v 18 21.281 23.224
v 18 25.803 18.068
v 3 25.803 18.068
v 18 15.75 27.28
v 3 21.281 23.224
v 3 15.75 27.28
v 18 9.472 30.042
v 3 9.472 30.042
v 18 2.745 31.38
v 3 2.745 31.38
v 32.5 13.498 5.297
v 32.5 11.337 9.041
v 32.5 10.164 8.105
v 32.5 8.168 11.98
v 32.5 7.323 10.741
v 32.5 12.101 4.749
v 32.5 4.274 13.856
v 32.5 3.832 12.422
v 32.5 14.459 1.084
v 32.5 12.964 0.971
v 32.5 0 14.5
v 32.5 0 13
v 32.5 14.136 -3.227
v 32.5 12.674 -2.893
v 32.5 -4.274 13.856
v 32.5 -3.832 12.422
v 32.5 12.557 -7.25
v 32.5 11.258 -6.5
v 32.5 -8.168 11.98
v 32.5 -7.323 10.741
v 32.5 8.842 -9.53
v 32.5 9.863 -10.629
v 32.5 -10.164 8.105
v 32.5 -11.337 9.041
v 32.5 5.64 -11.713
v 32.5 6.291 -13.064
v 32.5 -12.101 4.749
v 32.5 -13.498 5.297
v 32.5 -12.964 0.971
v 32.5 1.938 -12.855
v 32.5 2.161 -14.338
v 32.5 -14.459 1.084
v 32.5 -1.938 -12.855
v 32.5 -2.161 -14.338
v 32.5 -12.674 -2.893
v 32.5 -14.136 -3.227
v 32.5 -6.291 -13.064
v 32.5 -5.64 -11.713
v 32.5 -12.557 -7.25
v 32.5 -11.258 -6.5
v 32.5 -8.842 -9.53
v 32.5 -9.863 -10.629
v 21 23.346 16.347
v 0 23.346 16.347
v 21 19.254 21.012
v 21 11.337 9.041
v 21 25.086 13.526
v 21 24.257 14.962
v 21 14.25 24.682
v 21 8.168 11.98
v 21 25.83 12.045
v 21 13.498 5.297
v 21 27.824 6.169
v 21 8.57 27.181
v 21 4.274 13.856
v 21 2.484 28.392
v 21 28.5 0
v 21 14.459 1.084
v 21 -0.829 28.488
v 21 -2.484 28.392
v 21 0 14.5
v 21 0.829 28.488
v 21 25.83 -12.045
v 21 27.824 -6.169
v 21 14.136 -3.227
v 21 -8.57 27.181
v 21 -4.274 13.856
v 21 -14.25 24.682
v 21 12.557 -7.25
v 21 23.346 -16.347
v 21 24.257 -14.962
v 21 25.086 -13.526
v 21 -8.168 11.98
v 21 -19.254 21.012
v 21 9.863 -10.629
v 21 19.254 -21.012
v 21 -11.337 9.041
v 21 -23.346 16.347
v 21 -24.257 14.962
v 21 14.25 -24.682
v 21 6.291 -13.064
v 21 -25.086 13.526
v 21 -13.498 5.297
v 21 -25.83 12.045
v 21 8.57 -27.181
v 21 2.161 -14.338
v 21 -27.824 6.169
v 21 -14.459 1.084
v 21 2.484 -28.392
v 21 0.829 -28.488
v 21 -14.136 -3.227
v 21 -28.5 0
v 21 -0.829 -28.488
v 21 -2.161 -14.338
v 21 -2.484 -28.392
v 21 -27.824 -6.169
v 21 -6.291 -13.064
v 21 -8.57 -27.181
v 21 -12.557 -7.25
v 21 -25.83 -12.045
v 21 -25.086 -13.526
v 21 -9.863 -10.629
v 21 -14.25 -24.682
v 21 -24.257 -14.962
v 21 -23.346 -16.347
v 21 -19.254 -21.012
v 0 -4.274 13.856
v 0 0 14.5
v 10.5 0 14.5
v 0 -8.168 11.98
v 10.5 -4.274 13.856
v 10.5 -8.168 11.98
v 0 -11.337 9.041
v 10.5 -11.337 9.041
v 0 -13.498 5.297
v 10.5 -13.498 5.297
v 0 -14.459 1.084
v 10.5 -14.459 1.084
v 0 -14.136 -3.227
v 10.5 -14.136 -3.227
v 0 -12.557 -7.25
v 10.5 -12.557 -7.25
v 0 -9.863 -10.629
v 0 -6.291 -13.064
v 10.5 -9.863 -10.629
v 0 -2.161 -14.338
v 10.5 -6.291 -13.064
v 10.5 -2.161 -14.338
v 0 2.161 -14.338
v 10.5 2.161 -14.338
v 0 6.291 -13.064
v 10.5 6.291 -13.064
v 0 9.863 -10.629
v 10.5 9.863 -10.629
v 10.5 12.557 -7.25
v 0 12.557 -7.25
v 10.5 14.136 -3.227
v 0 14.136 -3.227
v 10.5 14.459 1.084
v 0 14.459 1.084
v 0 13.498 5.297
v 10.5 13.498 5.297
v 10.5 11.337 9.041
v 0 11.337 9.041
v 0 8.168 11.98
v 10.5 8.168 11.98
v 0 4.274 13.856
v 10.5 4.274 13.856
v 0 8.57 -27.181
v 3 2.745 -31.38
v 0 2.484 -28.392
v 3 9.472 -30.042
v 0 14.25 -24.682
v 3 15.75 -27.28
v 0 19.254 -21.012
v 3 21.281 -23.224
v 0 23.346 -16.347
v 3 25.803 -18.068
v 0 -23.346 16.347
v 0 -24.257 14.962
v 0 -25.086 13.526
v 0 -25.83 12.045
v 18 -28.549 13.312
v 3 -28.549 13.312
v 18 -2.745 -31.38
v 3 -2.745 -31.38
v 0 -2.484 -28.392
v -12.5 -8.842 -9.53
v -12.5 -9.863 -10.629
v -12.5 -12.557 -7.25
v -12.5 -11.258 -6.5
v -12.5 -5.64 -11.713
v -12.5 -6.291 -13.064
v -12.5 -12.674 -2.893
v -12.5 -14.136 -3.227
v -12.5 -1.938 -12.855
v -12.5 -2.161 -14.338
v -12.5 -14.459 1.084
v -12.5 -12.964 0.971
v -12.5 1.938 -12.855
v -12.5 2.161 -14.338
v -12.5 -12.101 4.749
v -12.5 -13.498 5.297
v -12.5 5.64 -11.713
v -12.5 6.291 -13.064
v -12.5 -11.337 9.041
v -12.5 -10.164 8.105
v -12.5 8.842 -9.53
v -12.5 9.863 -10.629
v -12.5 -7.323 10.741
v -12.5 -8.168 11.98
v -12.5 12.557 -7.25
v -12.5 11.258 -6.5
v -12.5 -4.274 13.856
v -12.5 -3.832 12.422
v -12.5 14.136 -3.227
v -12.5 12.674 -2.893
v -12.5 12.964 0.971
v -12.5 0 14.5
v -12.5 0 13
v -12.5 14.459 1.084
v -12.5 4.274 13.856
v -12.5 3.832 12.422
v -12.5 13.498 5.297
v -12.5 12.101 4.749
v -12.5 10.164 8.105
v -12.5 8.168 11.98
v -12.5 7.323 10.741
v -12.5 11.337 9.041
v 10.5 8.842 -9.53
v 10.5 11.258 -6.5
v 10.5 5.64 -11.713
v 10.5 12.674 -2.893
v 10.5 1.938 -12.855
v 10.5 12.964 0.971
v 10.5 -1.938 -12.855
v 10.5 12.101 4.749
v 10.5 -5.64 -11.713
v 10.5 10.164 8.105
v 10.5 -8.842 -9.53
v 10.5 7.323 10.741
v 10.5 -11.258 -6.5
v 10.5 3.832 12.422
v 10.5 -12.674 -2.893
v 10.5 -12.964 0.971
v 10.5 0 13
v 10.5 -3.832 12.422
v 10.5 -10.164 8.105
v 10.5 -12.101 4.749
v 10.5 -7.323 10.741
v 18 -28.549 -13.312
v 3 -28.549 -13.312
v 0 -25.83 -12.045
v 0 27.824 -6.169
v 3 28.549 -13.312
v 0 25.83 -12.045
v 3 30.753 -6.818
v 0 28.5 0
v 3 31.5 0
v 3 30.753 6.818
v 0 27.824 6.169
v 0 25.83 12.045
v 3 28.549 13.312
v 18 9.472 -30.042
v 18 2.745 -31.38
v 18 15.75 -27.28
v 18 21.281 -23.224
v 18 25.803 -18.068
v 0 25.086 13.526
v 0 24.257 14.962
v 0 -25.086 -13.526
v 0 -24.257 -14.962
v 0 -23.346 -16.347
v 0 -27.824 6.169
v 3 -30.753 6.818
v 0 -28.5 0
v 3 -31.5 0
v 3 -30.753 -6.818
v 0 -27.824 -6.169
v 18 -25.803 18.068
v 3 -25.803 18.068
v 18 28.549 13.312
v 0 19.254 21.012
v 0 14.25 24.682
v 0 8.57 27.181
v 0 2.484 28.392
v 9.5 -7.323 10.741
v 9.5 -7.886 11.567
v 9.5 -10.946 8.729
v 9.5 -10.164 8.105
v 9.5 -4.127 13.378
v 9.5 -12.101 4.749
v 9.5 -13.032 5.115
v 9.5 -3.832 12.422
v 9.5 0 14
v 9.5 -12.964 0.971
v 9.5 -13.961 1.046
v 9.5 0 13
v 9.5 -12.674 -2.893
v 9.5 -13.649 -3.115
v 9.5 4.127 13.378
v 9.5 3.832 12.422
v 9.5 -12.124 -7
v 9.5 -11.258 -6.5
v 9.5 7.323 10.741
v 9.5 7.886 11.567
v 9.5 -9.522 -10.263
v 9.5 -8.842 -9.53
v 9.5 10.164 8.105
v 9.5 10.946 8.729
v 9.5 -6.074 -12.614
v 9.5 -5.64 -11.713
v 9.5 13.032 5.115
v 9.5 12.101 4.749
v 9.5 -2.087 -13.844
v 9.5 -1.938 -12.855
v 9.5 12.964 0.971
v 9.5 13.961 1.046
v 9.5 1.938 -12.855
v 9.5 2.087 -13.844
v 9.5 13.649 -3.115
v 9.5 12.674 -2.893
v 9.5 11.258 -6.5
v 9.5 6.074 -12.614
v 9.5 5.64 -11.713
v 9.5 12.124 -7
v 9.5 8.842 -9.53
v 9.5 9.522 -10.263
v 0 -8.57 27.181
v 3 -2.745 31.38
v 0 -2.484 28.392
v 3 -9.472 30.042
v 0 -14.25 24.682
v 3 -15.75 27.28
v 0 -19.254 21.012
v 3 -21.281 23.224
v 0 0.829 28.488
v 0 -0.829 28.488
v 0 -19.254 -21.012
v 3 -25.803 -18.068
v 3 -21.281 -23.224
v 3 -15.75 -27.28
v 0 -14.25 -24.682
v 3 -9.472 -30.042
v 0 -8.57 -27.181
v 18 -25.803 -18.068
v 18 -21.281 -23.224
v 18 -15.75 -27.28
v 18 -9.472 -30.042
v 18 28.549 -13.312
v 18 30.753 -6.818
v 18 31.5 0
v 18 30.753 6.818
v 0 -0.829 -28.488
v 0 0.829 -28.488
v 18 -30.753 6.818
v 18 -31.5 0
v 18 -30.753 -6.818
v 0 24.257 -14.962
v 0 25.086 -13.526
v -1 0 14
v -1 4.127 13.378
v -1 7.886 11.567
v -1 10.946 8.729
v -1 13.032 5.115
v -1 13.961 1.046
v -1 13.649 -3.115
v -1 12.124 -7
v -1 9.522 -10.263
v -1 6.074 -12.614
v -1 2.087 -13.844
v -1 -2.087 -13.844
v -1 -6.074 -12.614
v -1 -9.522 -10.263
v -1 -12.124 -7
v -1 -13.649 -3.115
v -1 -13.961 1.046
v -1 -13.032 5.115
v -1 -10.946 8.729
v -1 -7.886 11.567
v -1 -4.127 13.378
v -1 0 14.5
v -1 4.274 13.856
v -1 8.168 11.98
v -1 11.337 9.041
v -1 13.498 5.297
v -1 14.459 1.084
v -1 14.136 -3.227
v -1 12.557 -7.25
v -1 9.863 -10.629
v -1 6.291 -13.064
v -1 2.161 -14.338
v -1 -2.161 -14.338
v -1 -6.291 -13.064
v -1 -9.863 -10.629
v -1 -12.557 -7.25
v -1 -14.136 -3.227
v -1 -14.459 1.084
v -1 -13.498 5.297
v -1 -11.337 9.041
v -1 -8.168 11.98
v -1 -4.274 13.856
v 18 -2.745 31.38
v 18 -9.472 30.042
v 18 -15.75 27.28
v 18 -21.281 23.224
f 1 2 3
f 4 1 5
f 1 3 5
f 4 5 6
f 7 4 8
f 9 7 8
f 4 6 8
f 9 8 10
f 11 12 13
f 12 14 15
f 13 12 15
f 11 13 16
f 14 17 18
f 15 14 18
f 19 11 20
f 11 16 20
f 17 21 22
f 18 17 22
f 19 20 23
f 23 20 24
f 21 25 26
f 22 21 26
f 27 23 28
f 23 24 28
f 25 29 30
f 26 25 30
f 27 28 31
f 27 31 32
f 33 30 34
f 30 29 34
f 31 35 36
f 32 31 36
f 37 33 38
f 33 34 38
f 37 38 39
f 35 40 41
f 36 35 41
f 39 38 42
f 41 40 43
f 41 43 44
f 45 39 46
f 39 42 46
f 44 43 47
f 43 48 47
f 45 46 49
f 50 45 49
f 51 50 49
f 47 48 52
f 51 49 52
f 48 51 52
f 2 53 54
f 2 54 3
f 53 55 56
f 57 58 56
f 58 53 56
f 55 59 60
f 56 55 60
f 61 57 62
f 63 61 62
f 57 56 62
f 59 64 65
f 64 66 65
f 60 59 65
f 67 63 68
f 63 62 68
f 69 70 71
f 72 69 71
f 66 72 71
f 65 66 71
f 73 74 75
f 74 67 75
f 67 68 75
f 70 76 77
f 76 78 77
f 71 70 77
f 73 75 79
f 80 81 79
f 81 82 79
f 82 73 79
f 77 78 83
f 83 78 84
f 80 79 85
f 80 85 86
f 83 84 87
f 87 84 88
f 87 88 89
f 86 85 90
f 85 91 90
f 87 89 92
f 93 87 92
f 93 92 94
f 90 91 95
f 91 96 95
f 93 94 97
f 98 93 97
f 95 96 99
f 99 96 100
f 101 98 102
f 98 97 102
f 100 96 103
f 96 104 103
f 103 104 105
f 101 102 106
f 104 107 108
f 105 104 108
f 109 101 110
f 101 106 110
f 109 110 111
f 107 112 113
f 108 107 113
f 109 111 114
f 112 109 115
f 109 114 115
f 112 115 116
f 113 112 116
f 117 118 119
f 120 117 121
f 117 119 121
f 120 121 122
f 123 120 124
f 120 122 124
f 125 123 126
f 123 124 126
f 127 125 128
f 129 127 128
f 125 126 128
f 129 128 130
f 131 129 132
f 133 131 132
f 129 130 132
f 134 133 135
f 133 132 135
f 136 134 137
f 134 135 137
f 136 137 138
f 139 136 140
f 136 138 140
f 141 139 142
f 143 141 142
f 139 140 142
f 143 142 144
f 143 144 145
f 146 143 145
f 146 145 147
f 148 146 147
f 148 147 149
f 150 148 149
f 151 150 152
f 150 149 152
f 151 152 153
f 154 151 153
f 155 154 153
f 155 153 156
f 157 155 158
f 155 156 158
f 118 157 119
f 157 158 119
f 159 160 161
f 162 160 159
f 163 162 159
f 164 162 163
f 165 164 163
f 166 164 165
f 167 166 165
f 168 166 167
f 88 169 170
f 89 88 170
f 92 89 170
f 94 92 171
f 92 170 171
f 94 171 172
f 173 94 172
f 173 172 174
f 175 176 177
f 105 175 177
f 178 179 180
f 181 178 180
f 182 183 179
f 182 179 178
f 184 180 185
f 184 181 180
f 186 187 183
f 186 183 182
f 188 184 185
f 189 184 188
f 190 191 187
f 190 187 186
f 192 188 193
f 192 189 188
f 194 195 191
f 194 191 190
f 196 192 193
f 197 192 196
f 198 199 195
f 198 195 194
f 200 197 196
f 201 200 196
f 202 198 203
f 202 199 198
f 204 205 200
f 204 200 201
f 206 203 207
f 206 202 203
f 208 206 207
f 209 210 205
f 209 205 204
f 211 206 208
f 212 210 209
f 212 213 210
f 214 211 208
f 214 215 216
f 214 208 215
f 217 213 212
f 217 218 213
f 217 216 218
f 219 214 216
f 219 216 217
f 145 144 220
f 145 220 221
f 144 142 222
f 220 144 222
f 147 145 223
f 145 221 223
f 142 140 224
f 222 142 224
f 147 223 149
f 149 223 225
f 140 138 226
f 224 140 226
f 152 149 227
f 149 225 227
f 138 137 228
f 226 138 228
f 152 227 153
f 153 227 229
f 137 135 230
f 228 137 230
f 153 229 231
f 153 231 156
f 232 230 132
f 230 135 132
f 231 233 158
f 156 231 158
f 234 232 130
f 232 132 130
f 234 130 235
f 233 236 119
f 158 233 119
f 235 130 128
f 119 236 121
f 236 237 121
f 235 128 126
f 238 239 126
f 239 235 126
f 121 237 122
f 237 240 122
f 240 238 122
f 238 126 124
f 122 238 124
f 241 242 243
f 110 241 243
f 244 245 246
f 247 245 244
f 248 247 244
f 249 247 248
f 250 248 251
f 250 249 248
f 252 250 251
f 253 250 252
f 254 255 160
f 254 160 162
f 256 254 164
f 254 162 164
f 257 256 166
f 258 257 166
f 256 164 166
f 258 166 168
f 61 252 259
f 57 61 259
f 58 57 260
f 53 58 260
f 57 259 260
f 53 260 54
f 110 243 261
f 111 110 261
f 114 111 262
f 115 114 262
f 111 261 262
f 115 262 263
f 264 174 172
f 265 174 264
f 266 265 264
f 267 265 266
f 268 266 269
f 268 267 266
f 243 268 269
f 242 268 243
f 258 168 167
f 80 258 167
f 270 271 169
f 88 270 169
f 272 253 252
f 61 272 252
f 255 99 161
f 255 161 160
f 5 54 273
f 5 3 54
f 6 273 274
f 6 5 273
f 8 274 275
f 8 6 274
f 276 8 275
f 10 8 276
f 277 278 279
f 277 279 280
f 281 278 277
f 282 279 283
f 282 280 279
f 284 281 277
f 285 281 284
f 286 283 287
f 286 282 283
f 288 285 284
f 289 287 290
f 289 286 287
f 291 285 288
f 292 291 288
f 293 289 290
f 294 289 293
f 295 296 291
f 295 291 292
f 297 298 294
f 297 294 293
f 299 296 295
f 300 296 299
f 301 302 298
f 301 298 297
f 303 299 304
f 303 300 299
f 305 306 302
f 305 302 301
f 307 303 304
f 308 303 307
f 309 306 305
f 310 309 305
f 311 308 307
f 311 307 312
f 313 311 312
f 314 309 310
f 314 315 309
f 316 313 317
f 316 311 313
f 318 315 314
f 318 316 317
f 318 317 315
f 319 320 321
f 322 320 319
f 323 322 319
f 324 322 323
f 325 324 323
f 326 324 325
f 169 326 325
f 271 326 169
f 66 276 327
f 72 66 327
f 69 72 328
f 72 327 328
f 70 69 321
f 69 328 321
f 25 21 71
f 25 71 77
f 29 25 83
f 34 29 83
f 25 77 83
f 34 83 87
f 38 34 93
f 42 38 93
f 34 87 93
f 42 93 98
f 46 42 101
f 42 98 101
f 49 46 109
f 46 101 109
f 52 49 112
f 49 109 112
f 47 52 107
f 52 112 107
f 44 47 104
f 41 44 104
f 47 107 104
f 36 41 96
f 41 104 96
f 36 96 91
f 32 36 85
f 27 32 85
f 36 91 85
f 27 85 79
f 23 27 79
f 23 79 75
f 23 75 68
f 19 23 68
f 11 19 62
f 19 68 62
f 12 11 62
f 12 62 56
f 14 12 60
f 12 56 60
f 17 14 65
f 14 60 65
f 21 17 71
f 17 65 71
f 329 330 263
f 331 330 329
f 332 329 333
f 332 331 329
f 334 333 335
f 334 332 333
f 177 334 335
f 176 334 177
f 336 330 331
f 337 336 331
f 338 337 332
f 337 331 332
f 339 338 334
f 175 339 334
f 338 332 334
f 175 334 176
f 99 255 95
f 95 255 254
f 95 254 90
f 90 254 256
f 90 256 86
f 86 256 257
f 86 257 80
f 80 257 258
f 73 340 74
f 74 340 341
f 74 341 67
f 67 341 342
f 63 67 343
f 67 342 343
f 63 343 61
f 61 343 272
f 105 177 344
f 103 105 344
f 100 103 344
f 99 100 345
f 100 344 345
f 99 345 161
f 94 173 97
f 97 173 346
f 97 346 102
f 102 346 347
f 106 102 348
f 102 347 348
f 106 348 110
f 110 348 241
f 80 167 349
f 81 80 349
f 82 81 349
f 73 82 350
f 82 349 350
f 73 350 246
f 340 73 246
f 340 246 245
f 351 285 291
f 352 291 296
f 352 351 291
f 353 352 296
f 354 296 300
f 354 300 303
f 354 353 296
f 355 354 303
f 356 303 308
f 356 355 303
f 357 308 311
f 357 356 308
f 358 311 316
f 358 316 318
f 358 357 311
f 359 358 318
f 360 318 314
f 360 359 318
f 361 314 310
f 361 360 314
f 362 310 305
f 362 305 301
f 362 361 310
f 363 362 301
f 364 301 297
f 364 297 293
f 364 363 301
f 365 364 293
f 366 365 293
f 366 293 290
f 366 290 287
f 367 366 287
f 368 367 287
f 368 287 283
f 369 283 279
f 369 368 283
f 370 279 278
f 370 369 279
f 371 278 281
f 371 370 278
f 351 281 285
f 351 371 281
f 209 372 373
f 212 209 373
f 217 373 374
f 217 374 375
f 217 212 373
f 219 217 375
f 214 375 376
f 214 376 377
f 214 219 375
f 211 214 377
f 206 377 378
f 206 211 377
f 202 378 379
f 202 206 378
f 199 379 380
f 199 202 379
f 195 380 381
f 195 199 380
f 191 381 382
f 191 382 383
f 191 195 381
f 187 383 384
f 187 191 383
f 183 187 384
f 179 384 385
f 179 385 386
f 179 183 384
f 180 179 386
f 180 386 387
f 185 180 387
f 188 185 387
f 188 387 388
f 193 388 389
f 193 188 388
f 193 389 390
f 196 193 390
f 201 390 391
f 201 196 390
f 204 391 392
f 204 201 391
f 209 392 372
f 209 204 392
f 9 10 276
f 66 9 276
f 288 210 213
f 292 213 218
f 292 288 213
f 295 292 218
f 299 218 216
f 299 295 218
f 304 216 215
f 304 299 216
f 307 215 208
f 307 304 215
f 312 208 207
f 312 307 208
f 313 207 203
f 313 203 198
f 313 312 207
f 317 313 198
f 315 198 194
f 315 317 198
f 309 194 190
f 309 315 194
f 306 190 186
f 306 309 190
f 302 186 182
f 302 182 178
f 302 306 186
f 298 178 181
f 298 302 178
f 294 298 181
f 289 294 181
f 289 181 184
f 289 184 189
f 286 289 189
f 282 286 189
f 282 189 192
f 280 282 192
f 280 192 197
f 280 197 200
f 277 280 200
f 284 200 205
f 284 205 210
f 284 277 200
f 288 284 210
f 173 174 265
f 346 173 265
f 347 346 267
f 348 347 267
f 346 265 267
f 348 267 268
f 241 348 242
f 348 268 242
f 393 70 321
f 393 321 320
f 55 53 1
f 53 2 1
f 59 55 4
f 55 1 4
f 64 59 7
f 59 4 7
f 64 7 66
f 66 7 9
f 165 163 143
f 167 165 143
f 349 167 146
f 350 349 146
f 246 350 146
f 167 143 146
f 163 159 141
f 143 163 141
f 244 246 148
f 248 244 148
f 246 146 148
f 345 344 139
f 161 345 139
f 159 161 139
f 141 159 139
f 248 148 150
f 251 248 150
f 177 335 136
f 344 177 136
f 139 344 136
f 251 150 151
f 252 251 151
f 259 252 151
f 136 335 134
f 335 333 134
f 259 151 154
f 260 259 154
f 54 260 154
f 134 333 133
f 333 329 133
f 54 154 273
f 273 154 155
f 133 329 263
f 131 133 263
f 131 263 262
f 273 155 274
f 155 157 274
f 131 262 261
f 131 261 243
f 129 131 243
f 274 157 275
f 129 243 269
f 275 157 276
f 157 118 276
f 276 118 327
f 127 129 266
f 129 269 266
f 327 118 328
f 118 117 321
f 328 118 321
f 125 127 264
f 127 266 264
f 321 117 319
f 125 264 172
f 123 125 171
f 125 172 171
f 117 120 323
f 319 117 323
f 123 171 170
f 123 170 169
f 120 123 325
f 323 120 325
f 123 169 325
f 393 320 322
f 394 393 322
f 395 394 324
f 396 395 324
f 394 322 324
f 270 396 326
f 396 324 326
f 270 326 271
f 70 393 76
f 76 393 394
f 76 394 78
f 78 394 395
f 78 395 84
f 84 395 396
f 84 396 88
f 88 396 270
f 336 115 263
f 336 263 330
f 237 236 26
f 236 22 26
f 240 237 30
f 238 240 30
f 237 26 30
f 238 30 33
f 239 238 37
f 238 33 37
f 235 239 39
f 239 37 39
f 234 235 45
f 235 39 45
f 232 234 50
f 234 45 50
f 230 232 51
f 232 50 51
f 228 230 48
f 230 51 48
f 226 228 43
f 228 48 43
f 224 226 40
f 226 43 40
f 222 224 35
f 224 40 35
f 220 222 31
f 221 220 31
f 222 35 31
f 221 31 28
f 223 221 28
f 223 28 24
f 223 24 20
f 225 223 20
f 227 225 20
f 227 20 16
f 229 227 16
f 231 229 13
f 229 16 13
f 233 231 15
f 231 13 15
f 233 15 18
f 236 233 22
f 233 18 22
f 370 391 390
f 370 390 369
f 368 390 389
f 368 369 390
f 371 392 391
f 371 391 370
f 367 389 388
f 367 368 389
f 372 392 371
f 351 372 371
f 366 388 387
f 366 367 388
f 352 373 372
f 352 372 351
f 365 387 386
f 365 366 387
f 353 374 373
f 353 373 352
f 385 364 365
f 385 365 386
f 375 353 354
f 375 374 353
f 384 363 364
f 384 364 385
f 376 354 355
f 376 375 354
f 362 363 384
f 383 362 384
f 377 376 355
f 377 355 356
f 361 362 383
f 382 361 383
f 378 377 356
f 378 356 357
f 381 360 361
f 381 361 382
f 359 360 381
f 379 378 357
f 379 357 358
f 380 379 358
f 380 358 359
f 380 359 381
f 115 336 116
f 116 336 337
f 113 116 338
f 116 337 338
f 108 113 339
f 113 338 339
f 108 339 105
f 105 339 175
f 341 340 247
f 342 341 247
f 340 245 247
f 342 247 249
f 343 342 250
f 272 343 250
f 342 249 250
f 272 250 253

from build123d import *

# Parameters (mm, degrees)
F2_SIZE  = 3
F4_DEPTH = 25


with BuildPart() as f1:
    # F0 (on Front) → F1 (revolve)
    with BuildSketch(Plane.XZ):
        Polygon((0, 31.5), (0, 14.5), (10.5, 14.5), (10.5, 13), (32.5, 13), (32.5, 14.5), (21, 14.5), (21, 31.5), align=None)
    revolve(axis=Axis((22.6291795194, 0, 0), (1, 0, 0)))

    # F2
    f2_edges = [f1.edges().sort_by_distance(p)[0] for p in [
        (0, 0, -31.5),
        (21, 0, -31.5),
    ]]
    chamfer(f2_edges, length=F2_SIZE)

    # F3 (on face) → F4 (cut)
    with BuildSketch(Plane(origin=(0, 0, 0), x_dir=(0, -1, 0), z_dir=(-1, 0, 0))):
        with BuildLine():
            Line((2.4839386683, 28.3915488956), (2.7454058966, 31.3801329899))
            ThreePointArc((2.7454058966, 31.3801329899), (0, 31.5), (-2.7454058966, 31.3801329899))
            Line((-2.7454058966, 31.3801329899), (-2.4839386683, 28.3915488956))
            ThreePointArc((-2.4839386683, 28.3915488956), (0, 28.5), (2.4839386683, 28.3915488956))
        make_face()
        with BuildLine():
            ThreePointArc((-25.8297719305, 12.0446204596), (-24.6817240079, 14.25), (-23.3458332622, 16.346928436))
            Line((-23.3458332622, 16.346928436), (-25.8032893951, 18.0676577451))
            ThreePointArc((-25.8032893951, 18.0676577451), (-27.2798002192, 15.75), (-28.5486952917, 13.3124752448))
            Line((-28.5486952917, 13.3124752448), (-25.8297719305, 12.0446204596))
        make_face()
        with BuildLine():
            ThreePointArc((-23.3458332622, -16.346928436), (-24.6817240079, -14.25), (-25.8297719305, -12.0446204596))
            Line((-25.8297719305, -12.0446204596), (-28.5486952917, -13.3124752448))
            ThreePointArc((-28.5486952917, -13.3124752448), (-27.2798002192, -15.75), (-25.8032893951, -18.0676577451))
            Line((-25.8032893951, -18.0676577451), (-23.3458332622, -16.346928436))
        make_face()
        with BuildLine():
            ThreePointArc((2.4839386683, -28.3915488956), (0, -28.5), (-2.4839386683, -28.3915488956))
            Line((-2.4839386683, -28.3915488956), (-2.7454058966, -31.3801329899))
            ThreePointArc((-2.7454058966, -31.3801329899), (0, -31.5), (2.7454058966, -31.3801329899))
            Line((2.7454058966, -31.3801329899), (2.4839386683, -28.3915488956))
        make_face()
        with BuildLine():
            ThreePointArc((25.8297719305, -12.0446204596), (24.6817240079, -14.25), (23.3458332622, -16.346928436))
            Line((23.3458332622, -16.346928436), (25.8032893951, -18.0676577451))
            ThreePointArc((25.8032893951, -18.0676577451), (27.2798002192, -15.75), (28.5486952917, -13.3124752448))
            Line((28.5486952917, -13.3124752448), (25.8297719305, -12.0446204596))
        make_face()
        with BuildLine():
            ThreePointArc((23.3458332622, 16.346928436), (24.6817240079, 14.25), (25.8297719305, 12.0446204596))
            Line((25.8297719305, 12.0446204596), (28.5486952917, 13.3124752448))
            ThreePointArc((28.5486952917, 13.3124752448), (27.2798002192, 15.75), (25.8032893951, 18.0676577451))
            Line((25.8032893951, 18.0676577451), (23.3458332622, 16.346928436))
        make_face()
    extrude(amount=-F4_DEPTH, mode=Mode.SUBTRACT)


with BuildPart() as f6:
    # F5 (on Front) → F6 (revolve)
    with BuildSketch(Plane.XZ):
        Polygon((-1, 14.5), (-12.5, 14.5), (-12.5, 13), (9.5, 13), (9.5, 14), (-1, 14), align=None)
    revolve(axis=Axis((-8.3157410845, 0, 0), (-1, 0, 0)))


solid = Compound([f1.part, f6.part])
